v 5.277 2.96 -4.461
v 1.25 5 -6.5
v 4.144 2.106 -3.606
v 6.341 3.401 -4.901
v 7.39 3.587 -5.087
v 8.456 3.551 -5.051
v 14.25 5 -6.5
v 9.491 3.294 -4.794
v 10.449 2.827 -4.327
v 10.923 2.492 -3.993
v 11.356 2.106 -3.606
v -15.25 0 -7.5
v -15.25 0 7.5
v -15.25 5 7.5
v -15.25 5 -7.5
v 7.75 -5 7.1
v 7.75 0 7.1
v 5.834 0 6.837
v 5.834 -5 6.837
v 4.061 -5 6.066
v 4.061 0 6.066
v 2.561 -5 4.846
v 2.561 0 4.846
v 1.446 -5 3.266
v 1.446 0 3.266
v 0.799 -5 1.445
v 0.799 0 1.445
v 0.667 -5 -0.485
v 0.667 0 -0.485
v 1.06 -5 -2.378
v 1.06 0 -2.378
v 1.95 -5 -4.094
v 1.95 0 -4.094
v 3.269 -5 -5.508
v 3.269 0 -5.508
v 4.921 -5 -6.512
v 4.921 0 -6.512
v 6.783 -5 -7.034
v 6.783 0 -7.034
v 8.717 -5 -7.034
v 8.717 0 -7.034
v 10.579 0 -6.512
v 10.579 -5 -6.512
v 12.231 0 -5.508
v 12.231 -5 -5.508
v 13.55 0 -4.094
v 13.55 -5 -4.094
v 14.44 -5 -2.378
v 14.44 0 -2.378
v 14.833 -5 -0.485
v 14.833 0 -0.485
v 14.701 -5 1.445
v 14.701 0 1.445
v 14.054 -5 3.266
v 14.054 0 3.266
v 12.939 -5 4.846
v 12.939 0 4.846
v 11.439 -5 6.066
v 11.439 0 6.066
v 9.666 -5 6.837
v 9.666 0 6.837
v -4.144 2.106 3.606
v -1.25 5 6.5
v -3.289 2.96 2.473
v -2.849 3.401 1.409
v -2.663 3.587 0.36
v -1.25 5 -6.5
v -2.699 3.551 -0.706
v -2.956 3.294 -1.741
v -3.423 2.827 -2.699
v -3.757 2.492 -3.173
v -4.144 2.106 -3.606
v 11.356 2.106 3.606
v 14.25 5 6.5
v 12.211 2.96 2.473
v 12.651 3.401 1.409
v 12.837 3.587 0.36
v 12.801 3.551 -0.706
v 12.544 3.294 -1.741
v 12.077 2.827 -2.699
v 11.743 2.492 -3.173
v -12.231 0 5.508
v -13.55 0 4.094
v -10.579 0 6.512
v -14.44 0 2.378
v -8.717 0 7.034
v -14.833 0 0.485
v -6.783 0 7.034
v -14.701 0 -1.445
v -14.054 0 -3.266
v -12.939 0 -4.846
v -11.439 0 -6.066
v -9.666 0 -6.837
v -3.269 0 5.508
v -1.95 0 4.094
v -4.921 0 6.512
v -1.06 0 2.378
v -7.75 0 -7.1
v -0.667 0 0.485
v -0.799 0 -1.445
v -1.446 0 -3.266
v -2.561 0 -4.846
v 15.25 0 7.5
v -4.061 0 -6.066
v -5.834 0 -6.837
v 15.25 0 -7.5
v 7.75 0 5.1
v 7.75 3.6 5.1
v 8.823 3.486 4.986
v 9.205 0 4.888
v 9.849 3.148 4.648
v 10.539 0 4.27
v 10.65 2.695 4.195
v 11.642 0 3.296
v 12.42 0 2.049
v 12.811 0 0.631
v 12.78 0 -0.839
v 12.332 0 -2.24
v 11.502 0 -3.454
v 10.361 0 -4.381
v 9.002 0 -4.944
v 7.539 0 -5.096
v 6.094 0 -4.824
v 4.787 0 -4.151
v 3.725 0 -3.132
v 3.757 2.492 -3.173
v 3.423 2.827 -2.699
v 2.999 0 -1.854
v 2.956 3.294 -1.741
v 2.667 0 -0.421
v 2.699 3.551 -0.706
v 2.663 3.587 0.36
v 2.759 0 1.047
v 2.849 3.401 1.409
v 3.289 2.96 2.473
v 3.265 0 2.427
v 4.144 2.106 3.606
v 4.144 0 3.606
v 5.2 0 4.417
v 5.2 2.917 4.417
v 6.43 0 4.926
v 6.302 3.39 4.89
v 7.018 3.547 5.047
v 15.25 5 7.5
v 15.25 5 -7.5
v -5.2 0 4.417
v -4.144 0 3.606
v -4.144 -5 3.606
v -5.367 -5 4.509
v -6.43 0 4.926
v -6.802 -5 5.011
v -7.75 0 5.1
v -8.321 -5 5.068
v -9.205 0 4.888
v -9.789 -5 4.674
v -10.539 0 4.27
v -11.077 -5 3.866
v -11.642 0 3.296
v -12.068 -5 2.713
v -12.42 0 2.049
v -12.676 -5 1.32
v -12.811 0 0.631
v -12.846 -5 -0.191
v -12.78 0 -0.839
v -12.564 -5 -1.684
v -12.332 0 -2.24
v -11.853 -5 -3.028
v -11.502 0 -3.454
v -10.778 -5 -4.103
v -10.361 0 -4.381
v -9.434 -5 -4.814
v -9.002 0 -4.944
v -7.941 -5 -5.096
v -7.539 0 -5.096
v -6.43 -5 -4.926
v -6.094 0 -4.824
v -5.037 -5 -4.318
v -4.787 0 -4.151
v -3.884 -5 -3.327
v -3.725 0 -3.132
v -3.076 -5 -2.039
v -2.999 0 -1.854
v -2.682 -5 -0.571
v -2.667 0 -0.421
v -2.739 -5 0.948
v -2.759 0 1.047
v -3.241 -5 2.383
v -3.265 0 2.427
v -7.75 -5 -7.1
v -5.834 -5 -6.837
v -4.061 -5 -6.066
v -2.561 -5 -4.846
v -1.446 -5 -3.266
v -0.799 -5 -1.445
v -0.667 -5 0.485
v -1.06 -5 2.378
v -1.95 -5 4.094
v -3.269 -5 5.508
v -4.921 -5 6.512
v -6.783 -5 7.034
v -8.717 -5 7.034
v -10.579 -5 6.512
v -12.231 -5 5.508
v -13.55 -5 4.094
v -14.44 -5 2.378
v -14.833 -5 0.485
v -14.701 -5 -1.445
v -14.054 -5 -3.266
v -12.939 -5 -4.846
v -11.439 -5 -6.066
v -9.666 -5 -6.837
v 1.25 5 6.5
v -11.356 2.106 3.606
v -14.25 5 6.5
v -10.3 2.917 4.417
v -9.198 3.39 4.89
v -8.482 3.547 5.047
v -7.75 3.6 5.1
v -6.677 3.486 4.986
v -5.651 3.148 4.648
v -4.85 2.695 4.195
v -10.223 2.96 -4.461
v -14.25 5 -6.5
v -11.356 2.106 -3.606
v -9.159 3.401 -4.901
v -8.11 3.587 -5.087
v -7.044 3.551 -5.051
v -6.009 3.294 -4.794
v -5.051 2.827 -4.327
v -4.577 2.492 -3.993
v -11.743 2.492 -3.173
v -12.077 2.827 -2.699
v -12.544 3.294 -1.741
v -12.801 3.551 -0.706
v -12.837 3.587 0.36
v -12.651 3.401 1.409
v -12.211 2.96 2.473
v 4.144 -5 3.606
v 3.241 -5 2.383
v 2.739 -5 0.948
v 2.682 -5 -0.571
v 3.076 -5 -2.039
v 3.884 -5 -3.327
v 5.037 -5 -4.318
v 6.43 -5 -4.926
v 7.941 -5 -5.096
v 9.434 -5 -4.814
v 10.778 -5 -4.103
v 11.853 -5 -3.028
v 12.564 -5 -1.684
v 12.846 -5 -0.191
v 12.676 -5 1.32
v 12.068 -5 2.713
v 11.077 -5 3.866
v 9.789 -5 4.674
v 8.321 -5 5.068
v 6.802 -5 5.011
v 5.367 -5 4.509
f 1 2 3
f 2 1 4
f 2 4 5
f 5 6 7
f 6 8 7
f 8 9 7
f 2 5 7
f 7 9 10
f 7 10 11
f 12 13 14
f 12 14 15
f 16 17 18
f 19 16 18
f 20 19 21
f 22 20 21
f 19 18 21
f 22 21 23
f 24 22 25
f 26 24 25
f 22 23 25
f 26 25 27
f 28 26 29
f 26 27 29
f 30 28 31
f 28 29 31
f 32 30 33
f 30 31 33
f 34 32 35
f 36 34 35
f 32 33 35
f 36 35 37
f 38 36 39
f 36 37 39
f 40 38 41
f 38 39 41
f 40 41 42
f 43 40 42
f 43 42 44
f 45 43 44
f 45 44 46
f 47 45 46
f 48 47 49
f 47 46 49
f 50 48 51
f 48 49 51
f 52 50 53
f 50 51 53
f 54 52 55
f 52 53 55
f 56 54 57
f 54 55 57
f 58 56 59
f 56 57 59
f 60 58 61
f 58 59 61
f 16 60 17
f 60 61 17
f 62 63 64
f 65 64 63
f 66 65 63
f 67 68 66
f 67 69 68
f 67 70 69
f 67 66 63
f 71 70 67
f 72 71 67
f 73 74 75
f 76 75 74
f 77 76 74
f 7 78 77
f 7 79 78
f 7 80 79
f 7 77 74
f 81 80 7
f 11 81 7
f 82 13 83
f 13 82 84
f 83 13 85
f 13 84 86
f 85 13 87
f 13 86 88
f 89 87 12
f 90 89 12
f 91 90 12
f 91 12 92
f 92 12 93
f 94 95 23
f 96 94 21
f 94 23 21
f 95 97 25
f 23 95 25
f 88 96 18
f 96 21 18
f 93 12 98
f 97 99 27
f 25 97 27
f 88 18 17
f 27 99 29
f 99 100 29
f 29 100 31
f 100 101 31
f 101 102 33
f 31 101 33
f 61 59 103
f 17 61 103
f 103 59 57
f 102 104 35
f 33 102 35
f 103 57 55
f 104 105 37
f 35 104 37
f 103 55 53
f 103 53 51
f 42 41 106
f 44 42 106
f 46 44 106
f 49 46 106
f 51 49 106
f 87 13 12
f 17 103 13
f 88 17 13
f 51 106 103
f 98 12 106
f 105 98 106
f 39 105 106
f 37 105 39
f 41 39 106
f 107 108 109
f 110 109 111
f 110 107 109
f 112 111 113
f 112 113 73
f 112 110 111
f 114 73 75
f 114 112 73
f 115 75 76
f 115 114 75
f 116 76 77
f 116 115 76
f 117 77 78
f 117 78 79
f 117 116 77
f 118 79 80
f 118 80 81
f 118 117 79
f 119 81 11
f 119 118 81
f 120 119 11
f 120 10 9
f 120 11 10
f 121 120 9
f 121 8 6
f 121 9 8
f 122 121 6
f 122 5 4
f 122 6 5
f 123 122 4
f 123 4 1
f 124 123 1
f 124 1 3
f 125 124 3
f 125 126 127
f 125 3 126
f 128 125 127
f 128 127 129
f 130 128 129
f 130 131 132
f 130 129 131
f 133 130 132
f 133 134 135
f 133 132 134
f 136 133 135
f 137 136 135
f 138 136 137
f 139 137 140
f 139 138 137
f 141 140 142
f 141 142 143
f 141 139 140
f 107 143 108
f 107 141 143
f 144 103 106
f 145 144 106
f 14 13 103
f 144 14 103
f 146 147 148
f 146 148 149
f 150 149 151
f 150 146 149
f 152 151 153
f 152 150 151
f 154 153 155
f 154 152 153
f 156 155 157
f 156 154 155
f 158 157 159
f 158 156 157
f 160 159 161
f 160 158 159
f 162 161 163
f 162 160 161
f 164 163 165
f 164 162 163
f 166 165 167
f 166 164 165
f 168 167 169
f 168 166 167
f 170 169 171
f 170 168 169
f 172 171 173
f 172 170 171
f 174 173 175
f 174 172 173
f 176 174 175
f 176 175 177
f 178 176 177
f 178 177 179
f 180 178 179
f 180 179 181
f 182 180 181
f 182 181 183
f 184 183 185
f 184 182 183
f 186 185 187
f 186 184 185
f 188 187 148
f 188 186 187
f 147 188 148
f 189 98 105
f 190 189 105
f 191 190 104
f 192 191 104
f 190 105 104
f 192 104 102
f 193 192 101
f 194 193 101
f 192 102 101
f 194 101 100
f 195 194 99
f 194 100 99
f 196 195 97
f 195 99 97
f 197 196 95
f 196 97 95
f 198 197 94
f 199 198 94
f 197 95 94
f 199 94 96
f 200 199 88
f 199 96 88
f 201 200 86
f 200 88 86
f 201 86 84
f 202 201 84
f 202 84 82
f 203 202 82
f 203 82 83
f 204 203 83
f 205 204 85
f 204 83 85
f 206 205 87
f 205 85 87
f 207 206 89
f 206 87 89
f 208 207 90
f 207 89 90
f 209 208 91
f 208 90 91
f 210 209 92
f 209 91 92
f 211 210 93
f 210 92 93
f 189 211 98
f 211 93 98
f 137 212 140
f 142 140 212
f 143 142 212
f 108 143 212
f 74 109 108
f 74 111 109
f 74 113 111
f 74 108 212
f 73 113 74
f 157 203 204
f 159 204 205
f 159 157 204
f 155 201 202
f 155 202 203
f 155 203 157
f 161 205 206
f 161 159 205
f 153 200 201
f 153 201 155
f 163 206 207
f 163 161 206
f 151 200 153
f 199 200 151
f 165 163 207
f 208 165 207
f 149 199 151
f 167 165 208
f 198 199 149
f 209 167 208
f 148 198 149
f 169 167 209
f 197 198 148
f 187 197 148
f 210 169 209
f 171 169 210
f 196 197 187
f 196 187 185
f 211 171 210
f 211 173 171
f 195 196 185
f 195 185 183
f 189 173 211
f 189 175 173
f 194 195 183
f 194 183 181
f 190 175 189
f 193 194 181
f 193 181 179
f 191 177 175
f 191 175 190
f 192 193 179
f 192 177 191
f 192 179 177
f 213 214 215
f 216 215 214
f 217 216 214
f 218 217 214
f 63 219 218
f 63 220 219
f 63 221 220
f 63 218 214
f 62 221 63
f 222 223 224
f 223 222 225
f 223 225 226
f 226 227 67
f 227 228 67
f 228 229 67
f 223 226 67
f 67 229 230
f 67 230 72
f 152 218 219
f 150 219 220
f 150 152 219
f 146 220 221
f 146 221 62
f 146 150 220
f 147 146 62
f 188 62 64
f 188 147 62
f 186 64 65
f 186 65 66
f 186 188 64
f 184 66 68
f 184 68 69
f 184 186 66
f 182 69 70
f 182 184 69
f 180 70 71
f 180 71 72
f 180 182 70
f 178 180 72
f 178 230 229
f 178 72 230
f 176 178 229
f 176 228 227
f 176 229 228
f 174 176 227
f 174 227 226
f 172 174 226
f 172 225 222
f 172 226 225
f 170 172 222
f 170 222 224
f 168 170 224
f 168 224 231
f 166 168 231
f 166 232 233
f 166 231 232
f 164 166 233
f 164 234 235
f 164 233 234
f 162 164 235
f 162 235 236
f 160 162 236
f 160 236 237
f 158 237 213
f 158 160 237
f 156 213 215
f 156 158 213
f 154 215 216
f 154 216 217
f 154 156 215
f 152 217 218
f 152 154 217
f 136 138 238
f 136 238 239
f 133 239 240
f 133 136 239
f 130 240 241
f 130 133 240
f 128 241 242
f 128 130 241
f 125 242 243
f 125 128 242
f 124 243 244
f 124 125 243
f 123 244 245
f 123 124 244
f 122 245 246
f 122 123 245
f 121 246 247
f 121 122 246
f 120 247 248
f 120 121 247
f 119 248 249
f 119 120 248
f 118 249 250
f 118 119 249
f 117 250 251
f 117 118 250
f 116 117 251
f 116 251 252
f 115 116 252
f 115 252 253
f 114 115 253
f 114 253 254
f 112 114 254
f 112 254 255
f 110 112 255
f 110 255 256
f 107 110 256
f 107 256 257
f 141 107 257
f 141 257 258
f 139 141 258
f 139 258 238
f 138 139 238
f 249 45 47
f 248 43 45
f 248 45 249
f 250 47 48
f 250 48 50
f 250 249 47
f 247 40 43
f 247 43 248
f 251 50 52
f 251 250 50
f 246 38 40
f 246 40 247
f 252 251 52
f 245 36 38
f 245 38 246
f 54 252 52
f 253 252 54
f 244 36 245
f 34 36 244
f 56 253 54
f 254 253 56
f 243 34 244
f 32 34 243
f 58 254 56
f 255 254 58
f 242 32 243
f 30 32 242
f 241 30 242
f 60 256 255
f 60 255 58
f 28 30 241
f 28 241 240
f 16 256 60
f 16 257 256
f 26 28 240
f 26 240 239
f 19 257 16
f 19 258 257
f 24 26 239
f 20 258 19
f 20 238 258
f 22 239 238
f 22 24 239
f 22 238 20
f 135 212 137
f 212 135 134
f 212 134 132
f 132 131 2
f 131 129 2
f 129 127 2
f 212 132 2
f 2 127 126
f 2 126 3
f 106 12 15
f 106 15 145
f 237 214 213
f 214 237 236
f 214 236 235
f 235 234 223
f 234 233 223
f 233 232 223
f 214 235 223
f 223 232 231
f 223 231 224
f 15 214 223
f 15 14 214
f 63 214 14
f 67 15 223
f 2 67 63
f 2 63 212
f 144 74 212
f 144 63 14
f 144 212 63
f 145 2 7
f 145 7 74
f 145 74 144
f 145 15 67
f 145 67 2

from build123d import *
from build123d.topology import SkipClean

# Parameters (mm, degrees)
SKETCH1_W               = 30.5
SKETCH1_H               = 15
BOSS_EXTRUDE1_DEPTH     = 5
SKETCH2_W               = 13
SKETCH2_H               = 13
CUT_EXTRUDE1_DEPTH      = 3
CHAMFER1_SIZE           = 3
CUT_EXTRUDE3_DEPTH      = 18.257244855
CUT_EXTRUDE3_DEPTH_BACK = 18.257244855
SKETCH4_R               = 5.1
SKETCH5_R               = 7.1
SKETCH5_R_2             = 5.1
BOSS_EXTRUDE3_DEPTH     = 5


with BuildPart() as part:
    # Sketch1 → Boss-Extrude1 (new body)
    with BuildSketch(Plane(origin=(0, 0, 0), x_dir=(1, 0, 0), z_dir=(0, 1, 0))):
        Rectangle(SKETCH1_W, SKETCH1_H)
    extrude(amount=BOSS_EXTRUDE1_DEPTH)

    # Sketch2 → Cut-Extrude1 (cut)
    with BuildSketch(Plane(origin=(0, 5, 0), x_dir=(1, 0, 0), z_dir=(0, 1, 0))):
        with Locations((-7.75, 0)):
            Rectangle(SKETCH2_W, SKETCH2_H)
        with Locations((7.75, 0)):
            Rectangle(SKETCH2_W, SKETCH2_H)
    extrude(amount=-CUT_EXTRUDE1_DEPTH, mode=Mode.SUBTRACT)

    # Chamfer1
    chamfer1_edges = [part.edges().sort_by_distance(p)[0] for p in [
        (-7.75, 2, -6.5),
        (-1.25, 2, 0),
        (-7.75, 2, 6.5),
        (-14.25, 2, 0),
        (7.75, 2, -6.5),
        (14.25, 2, 0),
        (7.75, 2, 6.5),
        (1.25, 2, 0),
    ]]
    chamfer(chamfer1_edges, length=CHAMFER1_SIZE - 0.0001)  # a hair under: the kernel refuses the full size

    # Sketch4 → Cut-Extrude3 (cut, two sides: drawn at the far end of the back side and taken through both)
    with BuildSketch(Plane(origin=(0, 2, 0), x_dir=(1, 0, 0), z_dir=(0, 1, 0)).offset(-CUT_EXTRUDE3_DEPTH_BACK)):
        with Locations(Location((-7.75, 0, 0), (0, 0, 270))):
            Circle(SKETCH4_R)
        with Locations(Location((7.75, 0, 0), (0, 0, 270))):
            Circle(SKETCH4_R)
    extrude(amount=CUT_EXTRUDE3_DEPTH + CUT_EXTRUDE3_DEPTH_BACK, mode=Mode.SUBTRACT)

    # Sketch5 → Boss-Extrude3 (add)
    # profile 1 of 2: a face of its own
    with SkipClean():  # the faces are left unmerged after this step: merging them gives an invalid solid
        with BuildSketch(Plane.XZ):
            with Locations(Location((-7.75, 0, 0), (0, 0, 270))):
                Circle(SKETCH5_R)
            with Locations(Location((-7.75, 0, 0), (0, 0, 45))):
                Circle(SKETCH5_R_2, mode=Mode.SUBTRACT)
        # profile 2 of 2: a face of its own
        with BuildSketch(Plane.XZ):
            with Locations(Location((7.75, 0, 0), (0, 0, 90))):
                Circle(SKETCH5_R)
            with Locations(Location((7.75, 0, 0), (0, 0, 135))):
                Circle(SKETCH5_R_2, mode=Mode.SUBTRACT)
        extrude(amount=BOSS_EXTRUDE3_DEPTH)


solid = part.part
